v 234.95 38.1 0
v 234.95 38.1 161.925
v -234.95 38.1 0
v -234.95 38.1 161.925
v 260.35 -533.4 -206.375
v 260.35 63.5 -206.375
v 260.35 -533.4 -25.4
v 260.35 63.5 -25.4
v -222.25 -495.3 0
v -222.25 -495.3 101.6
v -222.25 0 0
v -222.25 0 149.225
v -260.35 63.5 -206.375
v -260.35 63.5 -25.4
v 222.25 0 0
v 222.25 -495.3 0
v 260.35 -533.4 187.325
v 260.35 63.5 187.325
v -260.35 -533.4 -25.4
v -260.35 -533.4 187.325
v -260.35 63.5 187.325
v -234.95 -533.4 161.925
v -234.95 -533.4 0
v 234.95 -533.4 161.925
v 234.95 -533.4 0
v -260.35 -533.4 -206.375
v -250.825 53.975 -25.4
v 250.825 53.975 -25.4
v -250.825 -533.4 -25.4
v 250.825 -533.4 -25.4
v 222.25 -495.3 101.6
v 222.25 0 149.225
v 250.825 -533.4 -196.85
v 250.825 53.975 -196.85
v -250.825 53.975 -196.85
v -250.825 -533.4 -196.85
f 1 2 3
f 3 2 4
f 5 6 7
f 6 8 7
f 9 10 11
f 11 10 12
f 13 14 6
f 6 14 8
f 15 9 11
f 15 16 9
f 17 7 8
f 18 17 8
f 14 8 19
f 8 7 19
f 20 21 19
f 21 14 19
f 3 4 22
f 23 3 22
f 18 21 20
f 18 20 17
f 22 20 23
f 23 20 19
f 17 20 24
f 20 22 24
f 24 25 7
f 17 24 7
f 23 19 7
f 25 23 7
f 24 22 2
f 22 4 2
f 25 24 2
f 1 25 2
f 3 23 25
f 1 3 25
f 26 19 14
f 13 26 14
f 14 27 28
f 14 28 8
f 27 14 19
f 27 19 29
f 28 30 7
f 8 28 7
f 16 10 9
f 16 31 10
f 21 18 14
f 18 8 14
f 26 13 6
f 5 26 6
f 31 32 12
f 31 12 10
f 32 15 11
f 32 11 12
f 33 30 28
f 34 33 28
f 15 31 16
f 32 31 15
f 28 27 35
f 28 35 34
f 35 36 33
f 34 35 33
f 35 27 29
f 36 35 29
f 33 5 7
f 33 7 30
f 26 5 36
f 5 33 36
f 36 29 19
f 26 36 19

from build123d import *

# Parameters (mm, degrees)
F1_DEPTH      = 222.25
F1_DEPTH_BACK = 222.25
F2_W          = 469.9
F2_H          = 571.5
F2_W_2        = 444.5
F2_H_2        = 495.3
F3_DEPTH      = 25.4
F4_W          = 571.5
F4_H          = 161.925
F4_H_2        = 25.4
F5_DEPTH      = 25.4
F6_W          = 571.5
F6_H          = 161.925
F6_H_2        = 25.4
F7_DEPTH      = 25.4
F8_W          = 469.9
F8_H          = 161.925
F9_DEPTH      = 25.4
F10_W         = 469.9
F10_H         = 571.5
F11_DEPTH     = 25.4
F12_W         = 501.65
F12_H         = 9.525
F13_DEPTH     = 171.45
F14_W         = 501.65
F14_H         = 587.375
F15_DEPTH     = 9.525


with BuildPart() as f1:
    # F0 (on Right) → F1 (new body, two sides)
    with BuildSketch(Plane.YZ) as f1_sk:
        Polygon((-495.3, 0), (0, 0), (0, 149.225), (-495.3, 101.6), align=None)
    extrude(amount=F1_DEPTH)
    extrude(f1_sk.sketch, amount=-F1_DEPTH_BACK)


with BuildPart() as f3:
    # F2 (on face) → F3 (new body)
    with BuildSketch(Plane(origin=(0, 0, 0), x_dir=(1, 0, 0), z_dir=(0, 0, -1))):
        with Locations((0, 247.65)):
            Rectangle(F2_W, F2_H)
        with Locations((0, 247.65)):
            Rectangle(F2_W_2, F2_H_2, mode=Mode.SUBTRACT)
        with Locations((0, 247.65)):
            Rectangle(F2_W_2, F2_H_2)
    extrude(amount=F3_DEPTH)

    # F4 (on face) → F5 (join)
    with BuildSketch(Plane.YZ.offset(234.95)):
        with Locations((-247.65, 80.9625)):
            Rectangle(F4_W, F4_H)
        with Locations((-247.65, -12.7)):
            Rectangle(F4_W, F4_H_2)
    extrude(amount=F5_DEPTH)

    # F6 (on face) → F7 (join)
    with BuildSketch(Plane(origin=(-234.95, 0, 0), x_dir=(0, -1, 0), z_dir=(-1, 0, 0))):
        with Locations((247.65, 80.9625)):
            Rectangle(F6_W, F6_H)
        with Locations((247.65, -12.7)):
            Rectangle(F6_W, F6_H_2)
    extrude(amount=F7_DEPTH)

    # F8 (on face) → F9 (join)
    with BuildSketch(Plane(origin=(0, 38.1, 0), x_dir=(-1, 0, 0), z_dir=(0, 1, 0))):
        with Locations((0, 80.9625)):
            Rectangle(F8_W, F8_H)
        Polygon((-260.35, 161.925), (-260.35, -25.4), (260.35, -25.4), (260.35, 161.925), (234.95, 161.925), (234.95, 0), (-234.95, 0), (-234.95, 161.925), align=None)
    extrude(amount=F9_DEPTH)

    # F10 (on face) → F11 (join)
    with BuildSketch(Plane.XY.offset(161.925)):
        Polygon((234.95, -533.4), (260.35, -533.4), (260.35, 63.5), (-260.35, 63.5), (-260.35, -533.4), (-234.95, -533.4), (-234.95, 38.1), (234.95, 38.1), align=None)
        with Locations((0, -247.65)):
            Rectangle(F10_W, F10_H)
    extrude(amount=F11_DEPTH)


with BuildPart() as f13:
    # F12 (on face) → F13 (new body)
    with BuildSketch(Plane(origin=(0, 0, -25.4), x_dir=(1, 0, 0), z_dir=(0, 0, -1))):
        Polygon((260.35, -63.5), (260.35, 533.4), (250.825, 533.4), (250.825, 523.875), (250.825, -53.975), (250.825, -63.5), align=None)
        with Locations((0, -58.7375)):
            Rectangle(F12_W, F12_H)
        Polygon((-250.825, 523.875), (-250.825, 533.4), (-260.35, 533.4), (-260.35, -63.5), (-250.825, -63.5), (-250.825, -53.975), align=None)
    extrude(amount=F13_DEPTH)

    # F14 (on face) → F15 (join)
    with BuildSketch(Plane(origin=(0, 0, -196.85), x_dir=(1, 0, 0), z_dir=(0, 0, -1))):
        with Locations((0, 239.7125)):
            Rectangle(F14_W, F14_H)
        Polygon((-260.35, 533.4), (-260.35, -63.5), (260.35, -63.5), (260.35, 533.4), (250.825, 533.4), (250.825, -53.975), (-250.825, -53.975), (-250.825, 533.4), align=None)
    extrude(amount=F15_DEPTH)


solid = Compound([f1.part, f3.part, f13.part])
